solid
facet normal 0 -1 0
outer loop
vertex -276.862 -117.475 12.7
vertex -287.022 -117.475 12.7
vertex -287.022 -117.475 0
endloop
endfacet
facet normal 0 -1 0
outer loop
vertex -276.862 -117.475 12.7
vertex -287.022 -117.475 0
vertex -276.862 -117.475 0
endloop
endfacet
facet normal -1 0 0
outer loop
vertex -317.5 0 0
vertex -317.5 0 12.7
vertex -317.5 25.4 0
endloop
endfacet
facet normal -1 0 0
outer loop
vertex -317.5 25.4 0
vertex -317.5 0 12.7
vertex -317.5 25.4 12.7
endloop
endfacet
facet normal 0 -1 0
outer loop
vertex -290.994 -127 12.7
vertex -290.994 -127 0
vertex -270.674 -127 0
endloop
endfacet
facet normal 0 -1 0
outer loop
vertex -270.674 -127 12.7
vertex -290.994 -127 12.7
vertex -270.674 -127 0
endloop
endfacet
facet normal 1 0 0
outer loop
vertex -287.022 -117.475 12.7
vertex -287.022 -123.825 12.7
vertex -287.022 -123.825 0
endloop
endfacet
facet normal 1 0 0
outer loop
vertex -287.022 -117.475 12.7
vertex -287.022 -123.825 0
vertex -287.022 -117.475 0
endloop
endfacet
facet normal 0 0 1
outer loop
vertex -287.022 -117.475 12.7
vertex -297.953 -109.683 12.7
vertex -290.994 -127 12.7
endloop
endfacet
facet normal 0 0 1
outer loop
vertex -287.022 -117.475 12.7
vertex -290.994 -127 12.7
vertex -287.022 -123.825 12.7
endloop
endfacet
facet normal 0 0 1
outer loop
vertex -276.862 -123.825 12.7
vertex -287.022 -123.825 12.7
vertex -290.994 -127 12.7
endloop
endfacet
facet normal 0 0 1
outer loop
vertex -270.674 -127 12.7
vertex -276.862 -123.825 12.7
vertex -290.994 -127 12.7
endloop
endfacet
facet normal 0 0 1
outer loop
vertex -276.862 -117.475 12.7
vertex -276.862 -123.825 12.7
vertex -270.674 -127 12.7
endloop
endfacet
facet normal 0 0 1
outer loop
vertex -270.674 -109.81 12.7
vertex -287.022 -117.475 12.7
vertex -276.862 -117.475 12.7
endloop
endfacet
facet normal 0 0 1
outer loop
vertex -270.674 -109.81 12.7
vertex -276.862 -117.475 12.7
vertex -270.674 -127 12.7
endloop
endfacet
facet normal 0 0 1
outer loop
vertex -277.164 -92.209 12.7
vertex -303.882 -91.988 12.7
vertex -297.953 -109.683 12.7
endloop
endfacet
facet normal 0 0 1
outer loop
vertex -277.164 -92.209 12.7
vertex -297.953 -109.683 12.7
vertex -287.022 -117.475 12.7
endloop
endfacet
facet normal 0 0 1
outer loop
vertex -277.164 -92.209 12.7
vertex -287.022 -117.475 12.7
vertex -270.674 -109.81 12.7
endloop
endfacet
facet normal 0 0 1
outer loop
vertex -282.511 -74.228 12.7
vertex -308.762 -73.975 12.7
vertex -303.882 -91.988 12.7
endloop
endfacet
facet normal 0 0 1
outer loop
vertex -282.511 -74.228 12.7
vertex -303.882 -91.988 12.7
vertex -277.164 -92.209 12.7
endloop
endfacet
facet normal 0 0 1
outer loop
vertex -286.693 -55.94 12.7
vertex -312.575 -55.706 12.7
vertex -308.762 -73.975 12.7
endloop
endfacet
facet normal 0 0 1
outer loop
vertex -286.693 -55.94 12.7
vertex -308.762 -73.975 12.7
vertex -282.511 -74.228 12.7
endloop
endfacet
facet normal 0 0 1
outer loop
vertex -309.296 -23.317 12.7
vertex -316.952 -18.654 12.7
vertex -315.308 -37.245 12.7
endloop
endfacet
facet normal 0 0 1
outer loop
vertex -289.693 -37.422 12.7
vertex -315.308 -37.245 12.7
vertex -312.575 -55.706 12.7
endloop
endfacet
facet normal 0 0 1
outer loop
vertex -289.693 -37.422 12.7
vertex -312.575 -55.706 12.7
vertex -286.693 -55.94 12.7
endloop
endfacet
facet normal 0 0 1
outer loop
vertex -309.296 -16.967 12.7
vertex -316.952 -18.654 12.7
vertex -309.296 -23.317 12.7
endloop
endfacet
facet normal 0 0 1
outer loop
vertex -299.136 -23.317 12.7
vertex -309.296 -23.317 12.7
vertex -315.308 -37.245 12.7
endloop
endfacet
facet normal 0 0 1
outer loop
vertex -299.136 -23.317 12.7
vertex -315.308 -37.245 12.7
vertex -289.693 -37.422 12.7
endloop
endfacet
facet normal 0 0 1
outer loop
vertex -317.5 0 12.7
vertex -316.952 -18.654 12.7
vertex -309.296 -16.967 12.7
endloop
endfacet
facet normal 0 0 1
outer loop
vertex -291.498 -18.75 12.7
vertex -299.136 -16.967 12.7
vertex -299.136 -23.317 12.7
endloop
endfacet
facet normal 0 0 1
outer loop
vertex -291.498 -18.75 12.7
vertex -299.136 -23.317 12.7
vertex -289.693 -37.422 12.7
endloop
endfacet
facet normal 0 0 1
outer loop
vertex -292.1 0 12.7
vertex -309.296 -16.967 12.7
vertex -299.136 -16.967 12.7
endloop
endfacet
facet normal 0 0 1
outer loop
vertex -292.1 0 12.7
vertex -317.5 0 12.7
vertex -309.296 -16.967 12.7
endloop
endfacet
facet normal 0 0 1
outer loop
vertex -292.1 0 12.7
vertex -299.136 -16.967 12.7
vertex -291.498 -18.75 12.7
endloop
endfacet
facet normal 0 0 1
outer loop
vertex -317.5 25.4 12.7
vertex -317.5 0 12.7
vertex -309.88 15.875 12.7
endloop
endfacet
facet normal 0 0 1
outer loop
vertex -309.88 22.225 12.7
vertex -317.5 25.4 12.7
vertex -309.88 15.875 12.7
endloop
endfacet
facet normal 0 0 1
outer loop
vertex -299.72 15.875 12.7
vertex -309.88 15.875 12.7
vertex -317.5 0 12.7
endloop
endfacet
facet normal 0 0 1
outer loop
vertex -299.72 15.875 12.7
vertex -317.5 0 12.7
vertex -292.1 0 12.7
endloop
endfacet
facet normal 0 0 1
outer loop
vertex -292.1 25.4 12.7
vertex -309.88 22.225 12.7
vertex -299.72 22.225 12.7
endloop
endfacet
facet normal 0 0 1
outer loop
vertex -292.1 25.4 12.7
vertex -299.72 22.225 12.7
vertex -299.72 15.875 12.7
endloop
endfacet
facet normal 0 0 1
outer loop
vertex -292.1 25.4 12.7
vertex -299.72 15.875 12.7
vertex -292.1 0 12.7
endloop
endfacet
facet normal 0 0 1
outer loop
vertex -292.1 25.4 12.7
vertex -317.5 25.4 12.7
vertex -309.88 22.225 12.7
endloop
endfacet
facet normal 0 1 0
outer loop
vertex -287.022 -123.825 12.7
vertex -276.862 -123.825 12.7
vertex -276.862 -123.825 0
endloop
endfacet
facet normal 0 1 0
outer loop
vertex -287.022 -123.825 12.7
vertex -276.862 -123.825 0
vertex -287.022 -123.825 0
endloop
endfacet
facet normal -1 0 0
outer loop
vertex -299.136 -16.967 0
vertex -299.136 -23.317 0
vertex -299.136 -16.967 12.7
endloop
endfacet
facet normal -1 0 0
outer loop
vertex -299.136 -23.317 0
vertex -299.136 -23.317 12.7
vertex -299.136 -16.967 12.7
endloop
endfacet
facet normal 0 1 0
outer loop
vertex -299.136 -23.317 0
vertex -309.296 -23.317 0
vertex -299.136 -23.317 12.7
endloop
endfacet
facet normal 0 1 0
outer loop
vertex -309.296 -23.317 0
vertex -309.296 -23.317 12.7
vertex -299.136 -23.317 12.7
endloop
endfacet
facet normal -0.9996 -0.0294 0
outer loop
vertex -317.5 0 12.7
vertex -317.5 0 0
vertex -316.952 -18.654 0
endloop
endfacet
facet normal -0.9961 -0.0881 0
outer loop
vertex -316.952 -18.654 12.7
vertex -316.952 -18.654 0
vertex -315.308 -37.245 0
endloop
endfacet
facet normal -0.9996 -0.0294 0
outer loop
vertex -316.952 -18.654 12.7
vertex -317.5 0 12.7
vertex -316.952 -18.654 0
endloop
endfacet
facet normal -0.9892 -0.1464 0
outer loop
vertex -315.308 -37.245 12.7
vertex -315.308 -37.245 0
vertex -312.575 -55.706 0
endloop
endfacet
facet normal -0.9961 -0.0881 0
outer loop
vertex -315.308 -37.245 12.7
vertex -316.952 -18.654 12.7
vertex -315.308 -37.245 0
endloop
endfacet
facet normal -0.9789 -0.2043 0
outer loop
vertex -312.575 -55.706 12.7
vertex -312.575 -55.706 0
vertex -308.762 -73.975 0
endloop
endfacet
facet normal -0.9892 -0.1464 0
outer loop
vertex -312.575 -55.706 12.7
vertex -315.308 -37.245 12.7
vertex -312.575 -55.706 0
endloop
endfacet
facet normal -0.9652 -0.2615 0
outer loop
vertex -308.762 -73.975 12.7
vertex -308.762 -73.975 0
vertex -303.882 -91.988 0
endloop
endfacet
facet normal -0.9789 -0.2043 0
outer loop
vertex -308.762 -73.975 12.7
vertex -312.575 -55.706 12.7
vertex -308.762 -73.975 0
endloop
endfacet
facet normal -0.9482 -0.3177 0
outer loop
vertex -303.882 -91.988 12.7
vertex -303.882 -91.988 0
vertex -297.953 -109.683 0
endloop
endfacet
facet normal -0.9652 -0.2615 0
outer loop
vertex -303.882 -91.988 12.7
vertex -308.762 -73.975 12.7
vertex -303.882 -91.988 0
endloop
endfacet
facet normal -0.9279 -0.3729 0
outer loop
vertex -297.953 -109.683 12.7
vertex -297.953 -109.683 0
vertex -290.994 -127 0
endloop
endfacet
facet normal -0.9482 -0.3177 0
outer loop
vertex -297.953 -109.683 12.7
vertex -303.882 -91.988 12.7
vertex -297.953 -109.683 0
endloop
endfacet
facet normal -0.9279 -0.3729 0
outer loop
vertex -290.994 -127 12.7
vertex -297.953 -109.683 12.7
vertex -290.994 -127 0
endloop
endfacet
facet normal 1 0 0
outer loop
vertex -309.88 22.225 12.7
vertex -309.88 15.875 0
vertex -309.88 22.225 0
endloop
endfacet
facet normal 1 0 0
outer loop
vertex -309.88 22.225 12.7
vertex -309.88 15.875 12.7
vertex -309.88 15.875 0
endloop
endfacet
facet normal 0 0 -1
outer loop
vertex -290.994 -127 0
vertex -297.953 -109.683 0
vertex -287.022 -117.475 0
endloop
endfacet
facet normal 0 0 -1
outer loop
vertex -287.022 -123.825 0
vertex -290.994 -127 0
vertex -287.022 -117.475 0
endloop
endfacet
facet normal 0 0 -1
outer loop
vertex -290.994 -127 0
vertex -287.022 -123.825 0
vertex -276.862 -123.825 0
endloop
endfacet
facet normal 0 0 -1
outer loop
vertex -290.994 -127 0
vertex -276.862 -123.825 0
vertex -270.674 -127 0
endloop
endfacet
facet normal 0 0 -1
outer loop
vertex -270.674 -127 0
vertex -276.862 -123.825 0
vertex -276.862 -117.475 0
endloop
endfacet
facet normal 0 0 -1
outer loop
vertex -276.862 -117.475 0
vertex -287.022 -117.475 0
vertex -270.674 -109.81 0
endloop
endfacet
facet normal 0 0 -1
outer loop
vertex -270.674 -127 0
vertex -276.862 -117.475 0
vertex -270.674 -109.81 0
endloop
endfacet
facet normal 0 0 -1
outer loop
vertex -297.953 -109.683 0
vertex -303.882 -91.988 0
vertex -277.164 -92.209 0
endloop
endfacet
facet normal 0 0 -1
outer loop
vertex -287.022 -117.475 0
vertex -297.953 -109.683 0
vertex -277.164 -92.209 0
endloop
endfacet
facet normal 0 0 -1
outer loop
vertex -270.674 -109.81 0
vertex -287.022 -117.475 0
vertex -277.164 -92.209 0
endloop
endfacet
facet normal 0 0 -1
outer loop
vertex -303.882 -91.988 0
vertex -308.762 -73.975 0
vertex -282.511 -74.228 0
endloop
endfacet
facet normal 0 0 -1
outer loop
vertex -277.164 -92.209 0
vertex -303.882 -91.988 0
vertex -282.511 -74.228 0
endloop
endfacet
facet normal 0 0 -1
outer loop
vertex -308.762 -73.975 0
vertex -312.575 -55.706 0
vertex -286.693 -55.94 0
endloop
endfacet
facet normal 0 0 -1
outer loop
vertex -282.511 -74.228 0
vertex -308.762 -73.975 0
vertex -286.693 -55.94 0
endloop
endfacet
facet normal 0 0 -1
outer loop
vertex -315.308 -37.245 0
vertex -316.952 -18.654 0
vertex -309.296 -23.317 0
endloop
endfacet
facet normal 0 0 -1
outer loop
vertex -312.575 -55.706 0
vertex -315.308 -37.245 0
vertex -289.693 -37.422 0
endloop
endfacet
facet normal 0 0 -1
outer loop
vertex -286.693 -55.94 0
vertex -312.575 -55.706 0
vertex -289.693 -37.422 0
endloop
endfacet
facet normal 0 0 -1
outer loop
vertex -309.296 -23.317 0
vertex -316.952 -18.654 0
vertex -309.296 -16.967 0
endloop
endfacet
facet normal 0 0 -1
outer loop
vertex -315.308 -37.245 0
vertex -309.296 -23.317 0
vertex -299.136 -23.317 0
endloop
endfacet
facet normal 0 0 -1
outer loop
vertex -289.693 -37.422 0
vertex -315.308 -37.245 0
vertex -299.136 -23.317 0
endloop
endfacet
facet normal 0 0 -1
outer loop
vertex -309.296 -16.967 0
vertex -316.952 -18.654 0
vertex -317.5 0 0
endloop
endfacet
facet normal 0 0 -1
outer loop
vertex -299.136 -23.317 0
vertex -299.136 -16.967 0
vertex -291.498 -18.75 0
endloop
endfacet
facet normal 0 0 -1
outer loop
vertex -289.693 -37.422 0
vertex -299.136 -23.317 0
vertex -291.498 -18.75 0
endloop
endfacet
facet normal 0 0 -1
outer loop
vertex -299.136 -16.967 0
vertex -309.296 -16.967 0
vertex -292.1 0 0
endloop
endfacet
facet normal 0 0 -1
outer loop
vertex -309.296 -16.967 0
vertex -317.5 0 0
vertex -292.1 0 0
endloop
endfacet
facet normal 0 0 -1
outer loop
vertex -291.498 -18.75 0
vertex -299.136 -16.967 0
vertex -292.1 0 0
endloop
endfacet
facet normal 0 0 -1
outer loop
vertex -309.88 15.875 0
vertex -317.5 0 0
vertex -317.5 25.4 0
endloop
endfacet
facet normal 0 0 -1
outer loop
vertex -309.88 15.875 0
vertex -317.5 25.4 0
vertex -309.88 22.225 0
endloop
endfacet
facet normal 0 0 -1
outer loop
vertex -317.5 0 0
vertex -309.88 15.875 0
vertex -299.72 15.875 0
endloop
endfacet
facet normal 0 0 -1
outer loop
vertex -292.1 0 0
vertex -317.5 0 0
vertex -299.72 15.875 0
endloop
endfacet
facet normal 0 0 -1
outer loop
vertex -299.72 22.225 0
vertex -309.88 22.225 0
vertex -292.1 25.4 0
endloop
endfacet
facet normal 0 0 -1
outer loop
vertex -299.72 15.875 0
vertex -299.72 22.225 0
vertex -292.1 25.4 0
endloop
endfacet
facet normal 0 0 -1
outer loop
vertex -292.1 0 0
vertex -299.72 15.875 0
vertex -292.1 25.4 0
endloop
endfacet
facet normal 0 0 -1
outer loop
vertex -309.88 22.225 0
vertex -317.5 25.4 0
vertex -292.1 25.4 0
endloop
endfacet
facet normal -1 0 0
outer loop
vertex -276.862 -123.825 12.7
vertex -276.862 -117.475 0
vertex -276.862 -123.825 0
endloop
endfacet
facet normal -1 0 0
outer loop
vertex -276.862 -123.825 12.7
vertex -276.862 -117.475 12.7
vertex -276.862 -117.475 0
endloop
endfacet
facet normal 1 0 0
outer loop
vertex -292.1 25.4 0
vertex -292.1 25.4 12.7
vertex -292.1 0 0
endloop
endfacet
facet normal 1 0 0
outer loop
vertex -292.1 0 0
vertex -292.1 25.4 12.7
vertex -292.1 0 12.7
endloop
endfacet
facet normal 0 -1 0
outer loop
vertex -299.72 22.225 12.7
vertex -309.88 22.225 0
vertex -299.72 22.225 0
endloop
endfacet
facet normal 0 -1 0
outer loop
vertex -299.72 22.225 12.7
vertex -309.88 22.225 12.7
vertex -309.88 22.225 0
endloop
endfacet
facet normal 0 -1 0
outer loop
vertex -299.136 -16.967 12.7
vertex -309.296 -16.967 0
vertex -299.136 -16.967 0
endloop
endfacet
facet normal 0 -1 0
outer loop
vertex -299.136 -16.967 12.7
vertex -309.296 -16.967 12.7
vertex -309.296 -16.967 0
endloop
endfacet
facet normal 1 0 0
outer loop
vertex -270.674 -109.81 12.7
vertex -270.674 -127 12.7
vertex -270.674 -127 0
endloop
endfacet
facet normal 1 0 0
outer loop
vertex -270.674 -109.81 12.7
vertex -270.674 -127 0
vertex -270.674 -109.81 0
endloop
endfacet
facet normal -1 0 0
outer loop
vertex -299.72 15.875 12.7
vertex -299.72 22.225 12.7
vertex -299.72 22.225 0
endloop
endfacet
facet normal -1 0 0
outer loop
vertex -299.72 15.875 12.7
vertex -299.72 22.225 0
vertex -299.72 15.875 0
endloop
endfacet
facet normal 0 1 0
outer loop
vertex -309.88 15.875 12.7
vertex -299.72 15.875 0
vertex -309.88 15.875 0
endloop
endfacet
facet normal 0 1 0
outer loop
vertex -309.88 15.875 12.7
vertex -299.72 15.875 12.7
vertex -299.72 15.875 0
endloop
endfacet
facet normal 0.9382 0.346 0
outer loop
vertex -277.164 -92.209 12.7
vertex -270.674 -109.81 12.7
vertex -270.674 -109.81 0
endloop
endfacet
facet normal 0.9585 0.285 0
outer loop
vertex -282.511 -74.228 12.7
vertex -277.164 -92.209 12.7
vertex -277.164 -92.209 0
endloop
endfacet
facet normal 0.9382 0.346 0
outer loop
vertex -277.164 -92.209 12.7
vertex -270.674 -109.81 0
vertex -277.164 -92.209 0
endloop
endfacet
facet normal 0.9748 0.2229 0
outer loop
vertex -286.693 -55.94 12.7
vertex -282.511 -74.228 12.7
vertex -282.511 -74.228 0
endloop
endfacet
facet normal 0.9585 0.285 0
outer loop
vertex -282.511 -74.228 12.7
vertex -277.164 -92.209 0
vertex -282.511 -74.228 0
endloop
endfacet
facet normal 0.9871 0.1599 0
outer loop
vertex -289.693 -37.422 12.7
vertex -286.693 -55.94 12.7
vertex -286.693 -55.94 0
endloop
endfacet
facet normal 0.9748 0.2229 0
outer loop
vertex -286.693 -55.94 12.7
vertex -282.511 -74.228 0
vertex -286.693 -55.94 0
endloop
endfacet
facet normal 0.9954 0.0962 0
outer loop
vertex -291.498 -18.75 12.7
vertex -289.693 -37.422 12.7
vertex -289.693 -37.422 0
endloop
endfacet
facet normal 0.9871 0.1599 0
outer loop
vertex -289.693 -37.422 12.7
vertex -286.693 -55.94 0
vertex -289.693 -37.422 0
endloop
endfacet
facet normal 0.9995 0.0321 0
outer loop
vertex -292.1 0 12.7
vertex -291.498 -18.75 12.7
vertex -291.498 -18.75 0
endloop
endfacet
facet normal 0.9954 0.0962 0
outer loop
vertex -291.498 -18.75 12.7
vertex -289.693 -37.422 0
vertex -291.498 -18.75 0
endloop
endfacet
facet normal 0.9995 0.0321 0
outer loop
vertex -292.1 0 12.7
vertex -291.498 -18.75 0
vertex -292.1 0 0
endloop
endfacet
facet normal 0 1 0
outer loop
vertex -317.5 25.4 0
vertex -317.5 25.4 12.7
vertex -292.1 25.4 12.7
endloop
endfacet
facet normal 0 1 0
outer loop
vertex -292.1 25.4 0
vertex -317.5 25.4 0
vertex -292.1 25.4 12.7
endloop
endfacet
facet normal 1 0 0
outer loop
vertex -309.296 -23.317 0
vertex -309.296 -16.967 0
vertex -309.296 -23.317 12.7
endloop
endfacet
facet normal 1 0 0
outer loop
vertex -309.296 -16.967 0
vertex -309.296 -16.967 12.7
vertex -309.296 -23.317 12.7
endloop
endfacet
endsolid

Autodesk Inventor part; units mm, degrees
ref_plane "YZ Plane" through (0, 0, 0) normal (1, 0, 0) x (0, 1, 0)
ref_plane "XZ Plane" through (0, 0, 0) normal (0, 1, 0) x (-1, 0, 0)
ref_plane "XY Plane" through (0, 0, 0) normal (0, 0, 1) x (1, 0, 0)
sketch "Sketch1" plane through (0, 0, 0) normal (0, 0, 1) x (1, 0, 0)
  circle A0 centre (0, 0) radius 292.1
  line L0 (-292.1, 0) -> (-266.7, 0)
  line L1 (-292.1, 0) -> (-317.5, 0)
  circle A1 centre (0, 0) radius 317.5
  line L2 (-317.5, 0) -> (-317.5, -127)
  line L3 (-317.5, -127) -> (-263.0464, -127)
  circle A2 centre (0, 0) radius 317.5
  dimension "d0" = 584.2
  dimension "d1" = 25.4
  dimension "d2" = 25.4
  dimension "d3" = 127
extrude "Extrusion1" add sketch "Sketch1" along normal blind 12.7 contours A0 L3 A1 L1 | A1 L3 L2 picked at (-275.2864, -120.3141)
sketch "Sketch2" plane through (0, 0, 12.7) normal (0, 0, 1) x (1, 0, 0)
  line L0 (-317.5, 0) -> (-317.5, -127) projected
  line L1 (-317.5, -127) -> (-263.0464, -127) projected
  arc A0 (-292.1, 0) -> (-263.0464, -127) centre (0, 0) ccw projected
  circle A1 centre (0, 0) radius 292.1
  circle A2 centre (0, 0) radius 317.5
  line L2 (-317.5, 0) -> (-317.5, -127)
  line L3 (-317.5, -127) -> (-290.9936, -127)
extrude "Extrusion2" cut sketch "Sketch2" against normal blind 25.4 contours A2 L1 L0
sketch "Sketch3" plane through (0, 0, 12.7) normal (0, 0, 1) x (1, 0, 0)
  arc A0 (-317.5, 0) -> (-290.9936, -127) centre (0, 0) ccw projected
  line L0 (-290.9936, -127) -> (-316.1859, -127)
  line L1 (-295.9122, -115.0749) -> (-295.9122, -127)
  line L2 (-281.9422, -117.475) -> (-276.8622, -117.475)
  line L3 (-276.8622, -117.475) -> (-276.8622, -123.825)
  line L4 (-276.8622, -123.825) -> (-287.0222, -123.825)
  line L5 (-287.0222, -123.825) -> (-287.0222, -117.475)
  line L6 (-287.0222, -117.475) -> (-281.9422, -117.475)
  line L7 (-290.9936, -127) -> (-263.0464, -127) projected
  dimension "d16" = 5.08
  dimension "d17" = 6.35
  dimension "d18" = 10.16
  dimension "d20" = 4.9186
  dimension "d33" = 13.97
  dimension "d34" = 9.525
  dimension "d35" = 8.89
extrude "Extrusion3" cut sketch "Sketch3" against normal blind 25.4
sketch "Sketch4" plane through (0, 0, 12.7) normal (0, 0, 1) x (1, 0, 0)
  arc A0 (-317.5, 0) -> (-290.9936, -127) centre (0, 0) ccw projected
  arc A1 (-292.1, 0) -> (-263.0464, -127) centre (0, 0) ccw projected
  line L0 (-292.1, 0) -> (-317.5, 0) projected
  line L1 (-317.5, 0) -> (-317.5, 25.4)
  line L2 (-317.5, 25.4) -> (-292.1, 25.4)
  line L3 (-292.1, 25.4) -> (-292.1, 0)
  line L4 (-317.5, 0) -> (-292.1, 0)
  dimension "d24" = 25.4
extrude "Extrusion4" add sketch "Sketch4" against normal blind 12.7
sketch "Sketch5" plane through (0, 0, 12.7) normal (0, 0, 1) x (1, 0, 0)
  line L0 (-292.1, 0) -> (-292.1, 25.4) projected
  line L1 (-292.1, 25.4) -> (-317.5, 25.4) projected
  line L2 (-317.5, 25.4) -> (-317.5, 0) projected
  line L3 (-304.8, 25.4) -> (-304.8, 22.225)
  line L4 (-304.8, 22.225) -> (-299.72, 22.225)
  line L5 (-299.72, 22.225) -> (-299.72, 15.875)
  line L6 (-299.72, 15.875) -> (-309.88, 15.875)
  line L7 (-309.88, 15.875) -> (-309.88, 22.225)
  line L8 (-309.88, 22.225) -> (-304.8, 22.225)
  dimension "d27" = 3.175
  dimension "d28" = 5.08
  dimension "d29" = 6.35
  dimension "d30" = 10.16
extrude "Extrusion5" cut sketch "Sketch5" against normal blind 254
sketch "Sketch6" plane through (0, 0, 12.7) normal (0, 0, 1) x (1, 0, 0)
  line L0 (-290.9936, -127) -> (-263.0464, -127) projected
  arc A0 (-292.1, 0) -> (-263.0464, -127) centre (0, 0) ccw projected
  line L1 (-290.9936, -127) -> (-270.6736, -127)
  line L2 (-270.6736, -127) -> (-270.6736, -109.81)
  line L3 (-270.6736, -109.81) -> (-256.8603, -109.81)
  line L4 (-256.8603, -109.81) -> (-256.8603, -127)
  line L5 (-256.8603, -127) -> (-270.6736, -127)
  dimension "d36" = 20.32
  dimension "d37" = 13.8133
extrude "Extrusion6" cut sketch "Sketch6" against normal blind 254 contours L2 A0 L0
sketch "Sketch7" plane through (0, 0, 12.7) normal (0, 0, 1) x (1, 0, 0)
  arc A0 (-317.5, 0) -> (-290.9936, -127) centre (0, 0) ccw projected
  line L0 (-276.8622, -117.475) -> (-276.8622, -123.825) projected
  line L1 (-317.5, 0) -> (-317.5, -127) construction
  line L2 (-317.5, -63.5) -> (-317.5, -50.8) construction
  line L3 (-317.5, -50.8) -> (-317.5, -38.1) construction
  line L4 (-317.5, -38.1) -> (-317.5, -25.4) construction
  line L5 (-317.5, -25.4) -> (-317.5, -12.7) construction
  line L6 (-317.5, 23.7649) -> (-317.5, -16.9672) construction
  line L7 (-317.5, -16.9672) -> (-180.5967, -16.9672) construction
  line L8 (-317.5, -16.9672) -> (-309.2958, -16.9672) construction
  line L9 (-309.2958, -16.9672) -> (-309.2958, -23.3172)
  line L10 (-309.2958, -23.3172) -> (-299.1358, -23.3172)
  line L11 (-299.1358, -23.3172) -> (-299.1358, -16.9672)
  line L12 (-309.2958, -16.9672) -> (-299.1358, -16.9672)
  point P0 (-317.5, 25.4)
  dimension "d59" = 8.2042
  dimension "d60" = 6.35
  dimension "d61" = 10.16
  dimension "d65" = 42.3672
extrude "Extrusion8" cut sketch "Sketch7" against normal blind 25.4
properties part number "HopperFrontSupport_v2"
